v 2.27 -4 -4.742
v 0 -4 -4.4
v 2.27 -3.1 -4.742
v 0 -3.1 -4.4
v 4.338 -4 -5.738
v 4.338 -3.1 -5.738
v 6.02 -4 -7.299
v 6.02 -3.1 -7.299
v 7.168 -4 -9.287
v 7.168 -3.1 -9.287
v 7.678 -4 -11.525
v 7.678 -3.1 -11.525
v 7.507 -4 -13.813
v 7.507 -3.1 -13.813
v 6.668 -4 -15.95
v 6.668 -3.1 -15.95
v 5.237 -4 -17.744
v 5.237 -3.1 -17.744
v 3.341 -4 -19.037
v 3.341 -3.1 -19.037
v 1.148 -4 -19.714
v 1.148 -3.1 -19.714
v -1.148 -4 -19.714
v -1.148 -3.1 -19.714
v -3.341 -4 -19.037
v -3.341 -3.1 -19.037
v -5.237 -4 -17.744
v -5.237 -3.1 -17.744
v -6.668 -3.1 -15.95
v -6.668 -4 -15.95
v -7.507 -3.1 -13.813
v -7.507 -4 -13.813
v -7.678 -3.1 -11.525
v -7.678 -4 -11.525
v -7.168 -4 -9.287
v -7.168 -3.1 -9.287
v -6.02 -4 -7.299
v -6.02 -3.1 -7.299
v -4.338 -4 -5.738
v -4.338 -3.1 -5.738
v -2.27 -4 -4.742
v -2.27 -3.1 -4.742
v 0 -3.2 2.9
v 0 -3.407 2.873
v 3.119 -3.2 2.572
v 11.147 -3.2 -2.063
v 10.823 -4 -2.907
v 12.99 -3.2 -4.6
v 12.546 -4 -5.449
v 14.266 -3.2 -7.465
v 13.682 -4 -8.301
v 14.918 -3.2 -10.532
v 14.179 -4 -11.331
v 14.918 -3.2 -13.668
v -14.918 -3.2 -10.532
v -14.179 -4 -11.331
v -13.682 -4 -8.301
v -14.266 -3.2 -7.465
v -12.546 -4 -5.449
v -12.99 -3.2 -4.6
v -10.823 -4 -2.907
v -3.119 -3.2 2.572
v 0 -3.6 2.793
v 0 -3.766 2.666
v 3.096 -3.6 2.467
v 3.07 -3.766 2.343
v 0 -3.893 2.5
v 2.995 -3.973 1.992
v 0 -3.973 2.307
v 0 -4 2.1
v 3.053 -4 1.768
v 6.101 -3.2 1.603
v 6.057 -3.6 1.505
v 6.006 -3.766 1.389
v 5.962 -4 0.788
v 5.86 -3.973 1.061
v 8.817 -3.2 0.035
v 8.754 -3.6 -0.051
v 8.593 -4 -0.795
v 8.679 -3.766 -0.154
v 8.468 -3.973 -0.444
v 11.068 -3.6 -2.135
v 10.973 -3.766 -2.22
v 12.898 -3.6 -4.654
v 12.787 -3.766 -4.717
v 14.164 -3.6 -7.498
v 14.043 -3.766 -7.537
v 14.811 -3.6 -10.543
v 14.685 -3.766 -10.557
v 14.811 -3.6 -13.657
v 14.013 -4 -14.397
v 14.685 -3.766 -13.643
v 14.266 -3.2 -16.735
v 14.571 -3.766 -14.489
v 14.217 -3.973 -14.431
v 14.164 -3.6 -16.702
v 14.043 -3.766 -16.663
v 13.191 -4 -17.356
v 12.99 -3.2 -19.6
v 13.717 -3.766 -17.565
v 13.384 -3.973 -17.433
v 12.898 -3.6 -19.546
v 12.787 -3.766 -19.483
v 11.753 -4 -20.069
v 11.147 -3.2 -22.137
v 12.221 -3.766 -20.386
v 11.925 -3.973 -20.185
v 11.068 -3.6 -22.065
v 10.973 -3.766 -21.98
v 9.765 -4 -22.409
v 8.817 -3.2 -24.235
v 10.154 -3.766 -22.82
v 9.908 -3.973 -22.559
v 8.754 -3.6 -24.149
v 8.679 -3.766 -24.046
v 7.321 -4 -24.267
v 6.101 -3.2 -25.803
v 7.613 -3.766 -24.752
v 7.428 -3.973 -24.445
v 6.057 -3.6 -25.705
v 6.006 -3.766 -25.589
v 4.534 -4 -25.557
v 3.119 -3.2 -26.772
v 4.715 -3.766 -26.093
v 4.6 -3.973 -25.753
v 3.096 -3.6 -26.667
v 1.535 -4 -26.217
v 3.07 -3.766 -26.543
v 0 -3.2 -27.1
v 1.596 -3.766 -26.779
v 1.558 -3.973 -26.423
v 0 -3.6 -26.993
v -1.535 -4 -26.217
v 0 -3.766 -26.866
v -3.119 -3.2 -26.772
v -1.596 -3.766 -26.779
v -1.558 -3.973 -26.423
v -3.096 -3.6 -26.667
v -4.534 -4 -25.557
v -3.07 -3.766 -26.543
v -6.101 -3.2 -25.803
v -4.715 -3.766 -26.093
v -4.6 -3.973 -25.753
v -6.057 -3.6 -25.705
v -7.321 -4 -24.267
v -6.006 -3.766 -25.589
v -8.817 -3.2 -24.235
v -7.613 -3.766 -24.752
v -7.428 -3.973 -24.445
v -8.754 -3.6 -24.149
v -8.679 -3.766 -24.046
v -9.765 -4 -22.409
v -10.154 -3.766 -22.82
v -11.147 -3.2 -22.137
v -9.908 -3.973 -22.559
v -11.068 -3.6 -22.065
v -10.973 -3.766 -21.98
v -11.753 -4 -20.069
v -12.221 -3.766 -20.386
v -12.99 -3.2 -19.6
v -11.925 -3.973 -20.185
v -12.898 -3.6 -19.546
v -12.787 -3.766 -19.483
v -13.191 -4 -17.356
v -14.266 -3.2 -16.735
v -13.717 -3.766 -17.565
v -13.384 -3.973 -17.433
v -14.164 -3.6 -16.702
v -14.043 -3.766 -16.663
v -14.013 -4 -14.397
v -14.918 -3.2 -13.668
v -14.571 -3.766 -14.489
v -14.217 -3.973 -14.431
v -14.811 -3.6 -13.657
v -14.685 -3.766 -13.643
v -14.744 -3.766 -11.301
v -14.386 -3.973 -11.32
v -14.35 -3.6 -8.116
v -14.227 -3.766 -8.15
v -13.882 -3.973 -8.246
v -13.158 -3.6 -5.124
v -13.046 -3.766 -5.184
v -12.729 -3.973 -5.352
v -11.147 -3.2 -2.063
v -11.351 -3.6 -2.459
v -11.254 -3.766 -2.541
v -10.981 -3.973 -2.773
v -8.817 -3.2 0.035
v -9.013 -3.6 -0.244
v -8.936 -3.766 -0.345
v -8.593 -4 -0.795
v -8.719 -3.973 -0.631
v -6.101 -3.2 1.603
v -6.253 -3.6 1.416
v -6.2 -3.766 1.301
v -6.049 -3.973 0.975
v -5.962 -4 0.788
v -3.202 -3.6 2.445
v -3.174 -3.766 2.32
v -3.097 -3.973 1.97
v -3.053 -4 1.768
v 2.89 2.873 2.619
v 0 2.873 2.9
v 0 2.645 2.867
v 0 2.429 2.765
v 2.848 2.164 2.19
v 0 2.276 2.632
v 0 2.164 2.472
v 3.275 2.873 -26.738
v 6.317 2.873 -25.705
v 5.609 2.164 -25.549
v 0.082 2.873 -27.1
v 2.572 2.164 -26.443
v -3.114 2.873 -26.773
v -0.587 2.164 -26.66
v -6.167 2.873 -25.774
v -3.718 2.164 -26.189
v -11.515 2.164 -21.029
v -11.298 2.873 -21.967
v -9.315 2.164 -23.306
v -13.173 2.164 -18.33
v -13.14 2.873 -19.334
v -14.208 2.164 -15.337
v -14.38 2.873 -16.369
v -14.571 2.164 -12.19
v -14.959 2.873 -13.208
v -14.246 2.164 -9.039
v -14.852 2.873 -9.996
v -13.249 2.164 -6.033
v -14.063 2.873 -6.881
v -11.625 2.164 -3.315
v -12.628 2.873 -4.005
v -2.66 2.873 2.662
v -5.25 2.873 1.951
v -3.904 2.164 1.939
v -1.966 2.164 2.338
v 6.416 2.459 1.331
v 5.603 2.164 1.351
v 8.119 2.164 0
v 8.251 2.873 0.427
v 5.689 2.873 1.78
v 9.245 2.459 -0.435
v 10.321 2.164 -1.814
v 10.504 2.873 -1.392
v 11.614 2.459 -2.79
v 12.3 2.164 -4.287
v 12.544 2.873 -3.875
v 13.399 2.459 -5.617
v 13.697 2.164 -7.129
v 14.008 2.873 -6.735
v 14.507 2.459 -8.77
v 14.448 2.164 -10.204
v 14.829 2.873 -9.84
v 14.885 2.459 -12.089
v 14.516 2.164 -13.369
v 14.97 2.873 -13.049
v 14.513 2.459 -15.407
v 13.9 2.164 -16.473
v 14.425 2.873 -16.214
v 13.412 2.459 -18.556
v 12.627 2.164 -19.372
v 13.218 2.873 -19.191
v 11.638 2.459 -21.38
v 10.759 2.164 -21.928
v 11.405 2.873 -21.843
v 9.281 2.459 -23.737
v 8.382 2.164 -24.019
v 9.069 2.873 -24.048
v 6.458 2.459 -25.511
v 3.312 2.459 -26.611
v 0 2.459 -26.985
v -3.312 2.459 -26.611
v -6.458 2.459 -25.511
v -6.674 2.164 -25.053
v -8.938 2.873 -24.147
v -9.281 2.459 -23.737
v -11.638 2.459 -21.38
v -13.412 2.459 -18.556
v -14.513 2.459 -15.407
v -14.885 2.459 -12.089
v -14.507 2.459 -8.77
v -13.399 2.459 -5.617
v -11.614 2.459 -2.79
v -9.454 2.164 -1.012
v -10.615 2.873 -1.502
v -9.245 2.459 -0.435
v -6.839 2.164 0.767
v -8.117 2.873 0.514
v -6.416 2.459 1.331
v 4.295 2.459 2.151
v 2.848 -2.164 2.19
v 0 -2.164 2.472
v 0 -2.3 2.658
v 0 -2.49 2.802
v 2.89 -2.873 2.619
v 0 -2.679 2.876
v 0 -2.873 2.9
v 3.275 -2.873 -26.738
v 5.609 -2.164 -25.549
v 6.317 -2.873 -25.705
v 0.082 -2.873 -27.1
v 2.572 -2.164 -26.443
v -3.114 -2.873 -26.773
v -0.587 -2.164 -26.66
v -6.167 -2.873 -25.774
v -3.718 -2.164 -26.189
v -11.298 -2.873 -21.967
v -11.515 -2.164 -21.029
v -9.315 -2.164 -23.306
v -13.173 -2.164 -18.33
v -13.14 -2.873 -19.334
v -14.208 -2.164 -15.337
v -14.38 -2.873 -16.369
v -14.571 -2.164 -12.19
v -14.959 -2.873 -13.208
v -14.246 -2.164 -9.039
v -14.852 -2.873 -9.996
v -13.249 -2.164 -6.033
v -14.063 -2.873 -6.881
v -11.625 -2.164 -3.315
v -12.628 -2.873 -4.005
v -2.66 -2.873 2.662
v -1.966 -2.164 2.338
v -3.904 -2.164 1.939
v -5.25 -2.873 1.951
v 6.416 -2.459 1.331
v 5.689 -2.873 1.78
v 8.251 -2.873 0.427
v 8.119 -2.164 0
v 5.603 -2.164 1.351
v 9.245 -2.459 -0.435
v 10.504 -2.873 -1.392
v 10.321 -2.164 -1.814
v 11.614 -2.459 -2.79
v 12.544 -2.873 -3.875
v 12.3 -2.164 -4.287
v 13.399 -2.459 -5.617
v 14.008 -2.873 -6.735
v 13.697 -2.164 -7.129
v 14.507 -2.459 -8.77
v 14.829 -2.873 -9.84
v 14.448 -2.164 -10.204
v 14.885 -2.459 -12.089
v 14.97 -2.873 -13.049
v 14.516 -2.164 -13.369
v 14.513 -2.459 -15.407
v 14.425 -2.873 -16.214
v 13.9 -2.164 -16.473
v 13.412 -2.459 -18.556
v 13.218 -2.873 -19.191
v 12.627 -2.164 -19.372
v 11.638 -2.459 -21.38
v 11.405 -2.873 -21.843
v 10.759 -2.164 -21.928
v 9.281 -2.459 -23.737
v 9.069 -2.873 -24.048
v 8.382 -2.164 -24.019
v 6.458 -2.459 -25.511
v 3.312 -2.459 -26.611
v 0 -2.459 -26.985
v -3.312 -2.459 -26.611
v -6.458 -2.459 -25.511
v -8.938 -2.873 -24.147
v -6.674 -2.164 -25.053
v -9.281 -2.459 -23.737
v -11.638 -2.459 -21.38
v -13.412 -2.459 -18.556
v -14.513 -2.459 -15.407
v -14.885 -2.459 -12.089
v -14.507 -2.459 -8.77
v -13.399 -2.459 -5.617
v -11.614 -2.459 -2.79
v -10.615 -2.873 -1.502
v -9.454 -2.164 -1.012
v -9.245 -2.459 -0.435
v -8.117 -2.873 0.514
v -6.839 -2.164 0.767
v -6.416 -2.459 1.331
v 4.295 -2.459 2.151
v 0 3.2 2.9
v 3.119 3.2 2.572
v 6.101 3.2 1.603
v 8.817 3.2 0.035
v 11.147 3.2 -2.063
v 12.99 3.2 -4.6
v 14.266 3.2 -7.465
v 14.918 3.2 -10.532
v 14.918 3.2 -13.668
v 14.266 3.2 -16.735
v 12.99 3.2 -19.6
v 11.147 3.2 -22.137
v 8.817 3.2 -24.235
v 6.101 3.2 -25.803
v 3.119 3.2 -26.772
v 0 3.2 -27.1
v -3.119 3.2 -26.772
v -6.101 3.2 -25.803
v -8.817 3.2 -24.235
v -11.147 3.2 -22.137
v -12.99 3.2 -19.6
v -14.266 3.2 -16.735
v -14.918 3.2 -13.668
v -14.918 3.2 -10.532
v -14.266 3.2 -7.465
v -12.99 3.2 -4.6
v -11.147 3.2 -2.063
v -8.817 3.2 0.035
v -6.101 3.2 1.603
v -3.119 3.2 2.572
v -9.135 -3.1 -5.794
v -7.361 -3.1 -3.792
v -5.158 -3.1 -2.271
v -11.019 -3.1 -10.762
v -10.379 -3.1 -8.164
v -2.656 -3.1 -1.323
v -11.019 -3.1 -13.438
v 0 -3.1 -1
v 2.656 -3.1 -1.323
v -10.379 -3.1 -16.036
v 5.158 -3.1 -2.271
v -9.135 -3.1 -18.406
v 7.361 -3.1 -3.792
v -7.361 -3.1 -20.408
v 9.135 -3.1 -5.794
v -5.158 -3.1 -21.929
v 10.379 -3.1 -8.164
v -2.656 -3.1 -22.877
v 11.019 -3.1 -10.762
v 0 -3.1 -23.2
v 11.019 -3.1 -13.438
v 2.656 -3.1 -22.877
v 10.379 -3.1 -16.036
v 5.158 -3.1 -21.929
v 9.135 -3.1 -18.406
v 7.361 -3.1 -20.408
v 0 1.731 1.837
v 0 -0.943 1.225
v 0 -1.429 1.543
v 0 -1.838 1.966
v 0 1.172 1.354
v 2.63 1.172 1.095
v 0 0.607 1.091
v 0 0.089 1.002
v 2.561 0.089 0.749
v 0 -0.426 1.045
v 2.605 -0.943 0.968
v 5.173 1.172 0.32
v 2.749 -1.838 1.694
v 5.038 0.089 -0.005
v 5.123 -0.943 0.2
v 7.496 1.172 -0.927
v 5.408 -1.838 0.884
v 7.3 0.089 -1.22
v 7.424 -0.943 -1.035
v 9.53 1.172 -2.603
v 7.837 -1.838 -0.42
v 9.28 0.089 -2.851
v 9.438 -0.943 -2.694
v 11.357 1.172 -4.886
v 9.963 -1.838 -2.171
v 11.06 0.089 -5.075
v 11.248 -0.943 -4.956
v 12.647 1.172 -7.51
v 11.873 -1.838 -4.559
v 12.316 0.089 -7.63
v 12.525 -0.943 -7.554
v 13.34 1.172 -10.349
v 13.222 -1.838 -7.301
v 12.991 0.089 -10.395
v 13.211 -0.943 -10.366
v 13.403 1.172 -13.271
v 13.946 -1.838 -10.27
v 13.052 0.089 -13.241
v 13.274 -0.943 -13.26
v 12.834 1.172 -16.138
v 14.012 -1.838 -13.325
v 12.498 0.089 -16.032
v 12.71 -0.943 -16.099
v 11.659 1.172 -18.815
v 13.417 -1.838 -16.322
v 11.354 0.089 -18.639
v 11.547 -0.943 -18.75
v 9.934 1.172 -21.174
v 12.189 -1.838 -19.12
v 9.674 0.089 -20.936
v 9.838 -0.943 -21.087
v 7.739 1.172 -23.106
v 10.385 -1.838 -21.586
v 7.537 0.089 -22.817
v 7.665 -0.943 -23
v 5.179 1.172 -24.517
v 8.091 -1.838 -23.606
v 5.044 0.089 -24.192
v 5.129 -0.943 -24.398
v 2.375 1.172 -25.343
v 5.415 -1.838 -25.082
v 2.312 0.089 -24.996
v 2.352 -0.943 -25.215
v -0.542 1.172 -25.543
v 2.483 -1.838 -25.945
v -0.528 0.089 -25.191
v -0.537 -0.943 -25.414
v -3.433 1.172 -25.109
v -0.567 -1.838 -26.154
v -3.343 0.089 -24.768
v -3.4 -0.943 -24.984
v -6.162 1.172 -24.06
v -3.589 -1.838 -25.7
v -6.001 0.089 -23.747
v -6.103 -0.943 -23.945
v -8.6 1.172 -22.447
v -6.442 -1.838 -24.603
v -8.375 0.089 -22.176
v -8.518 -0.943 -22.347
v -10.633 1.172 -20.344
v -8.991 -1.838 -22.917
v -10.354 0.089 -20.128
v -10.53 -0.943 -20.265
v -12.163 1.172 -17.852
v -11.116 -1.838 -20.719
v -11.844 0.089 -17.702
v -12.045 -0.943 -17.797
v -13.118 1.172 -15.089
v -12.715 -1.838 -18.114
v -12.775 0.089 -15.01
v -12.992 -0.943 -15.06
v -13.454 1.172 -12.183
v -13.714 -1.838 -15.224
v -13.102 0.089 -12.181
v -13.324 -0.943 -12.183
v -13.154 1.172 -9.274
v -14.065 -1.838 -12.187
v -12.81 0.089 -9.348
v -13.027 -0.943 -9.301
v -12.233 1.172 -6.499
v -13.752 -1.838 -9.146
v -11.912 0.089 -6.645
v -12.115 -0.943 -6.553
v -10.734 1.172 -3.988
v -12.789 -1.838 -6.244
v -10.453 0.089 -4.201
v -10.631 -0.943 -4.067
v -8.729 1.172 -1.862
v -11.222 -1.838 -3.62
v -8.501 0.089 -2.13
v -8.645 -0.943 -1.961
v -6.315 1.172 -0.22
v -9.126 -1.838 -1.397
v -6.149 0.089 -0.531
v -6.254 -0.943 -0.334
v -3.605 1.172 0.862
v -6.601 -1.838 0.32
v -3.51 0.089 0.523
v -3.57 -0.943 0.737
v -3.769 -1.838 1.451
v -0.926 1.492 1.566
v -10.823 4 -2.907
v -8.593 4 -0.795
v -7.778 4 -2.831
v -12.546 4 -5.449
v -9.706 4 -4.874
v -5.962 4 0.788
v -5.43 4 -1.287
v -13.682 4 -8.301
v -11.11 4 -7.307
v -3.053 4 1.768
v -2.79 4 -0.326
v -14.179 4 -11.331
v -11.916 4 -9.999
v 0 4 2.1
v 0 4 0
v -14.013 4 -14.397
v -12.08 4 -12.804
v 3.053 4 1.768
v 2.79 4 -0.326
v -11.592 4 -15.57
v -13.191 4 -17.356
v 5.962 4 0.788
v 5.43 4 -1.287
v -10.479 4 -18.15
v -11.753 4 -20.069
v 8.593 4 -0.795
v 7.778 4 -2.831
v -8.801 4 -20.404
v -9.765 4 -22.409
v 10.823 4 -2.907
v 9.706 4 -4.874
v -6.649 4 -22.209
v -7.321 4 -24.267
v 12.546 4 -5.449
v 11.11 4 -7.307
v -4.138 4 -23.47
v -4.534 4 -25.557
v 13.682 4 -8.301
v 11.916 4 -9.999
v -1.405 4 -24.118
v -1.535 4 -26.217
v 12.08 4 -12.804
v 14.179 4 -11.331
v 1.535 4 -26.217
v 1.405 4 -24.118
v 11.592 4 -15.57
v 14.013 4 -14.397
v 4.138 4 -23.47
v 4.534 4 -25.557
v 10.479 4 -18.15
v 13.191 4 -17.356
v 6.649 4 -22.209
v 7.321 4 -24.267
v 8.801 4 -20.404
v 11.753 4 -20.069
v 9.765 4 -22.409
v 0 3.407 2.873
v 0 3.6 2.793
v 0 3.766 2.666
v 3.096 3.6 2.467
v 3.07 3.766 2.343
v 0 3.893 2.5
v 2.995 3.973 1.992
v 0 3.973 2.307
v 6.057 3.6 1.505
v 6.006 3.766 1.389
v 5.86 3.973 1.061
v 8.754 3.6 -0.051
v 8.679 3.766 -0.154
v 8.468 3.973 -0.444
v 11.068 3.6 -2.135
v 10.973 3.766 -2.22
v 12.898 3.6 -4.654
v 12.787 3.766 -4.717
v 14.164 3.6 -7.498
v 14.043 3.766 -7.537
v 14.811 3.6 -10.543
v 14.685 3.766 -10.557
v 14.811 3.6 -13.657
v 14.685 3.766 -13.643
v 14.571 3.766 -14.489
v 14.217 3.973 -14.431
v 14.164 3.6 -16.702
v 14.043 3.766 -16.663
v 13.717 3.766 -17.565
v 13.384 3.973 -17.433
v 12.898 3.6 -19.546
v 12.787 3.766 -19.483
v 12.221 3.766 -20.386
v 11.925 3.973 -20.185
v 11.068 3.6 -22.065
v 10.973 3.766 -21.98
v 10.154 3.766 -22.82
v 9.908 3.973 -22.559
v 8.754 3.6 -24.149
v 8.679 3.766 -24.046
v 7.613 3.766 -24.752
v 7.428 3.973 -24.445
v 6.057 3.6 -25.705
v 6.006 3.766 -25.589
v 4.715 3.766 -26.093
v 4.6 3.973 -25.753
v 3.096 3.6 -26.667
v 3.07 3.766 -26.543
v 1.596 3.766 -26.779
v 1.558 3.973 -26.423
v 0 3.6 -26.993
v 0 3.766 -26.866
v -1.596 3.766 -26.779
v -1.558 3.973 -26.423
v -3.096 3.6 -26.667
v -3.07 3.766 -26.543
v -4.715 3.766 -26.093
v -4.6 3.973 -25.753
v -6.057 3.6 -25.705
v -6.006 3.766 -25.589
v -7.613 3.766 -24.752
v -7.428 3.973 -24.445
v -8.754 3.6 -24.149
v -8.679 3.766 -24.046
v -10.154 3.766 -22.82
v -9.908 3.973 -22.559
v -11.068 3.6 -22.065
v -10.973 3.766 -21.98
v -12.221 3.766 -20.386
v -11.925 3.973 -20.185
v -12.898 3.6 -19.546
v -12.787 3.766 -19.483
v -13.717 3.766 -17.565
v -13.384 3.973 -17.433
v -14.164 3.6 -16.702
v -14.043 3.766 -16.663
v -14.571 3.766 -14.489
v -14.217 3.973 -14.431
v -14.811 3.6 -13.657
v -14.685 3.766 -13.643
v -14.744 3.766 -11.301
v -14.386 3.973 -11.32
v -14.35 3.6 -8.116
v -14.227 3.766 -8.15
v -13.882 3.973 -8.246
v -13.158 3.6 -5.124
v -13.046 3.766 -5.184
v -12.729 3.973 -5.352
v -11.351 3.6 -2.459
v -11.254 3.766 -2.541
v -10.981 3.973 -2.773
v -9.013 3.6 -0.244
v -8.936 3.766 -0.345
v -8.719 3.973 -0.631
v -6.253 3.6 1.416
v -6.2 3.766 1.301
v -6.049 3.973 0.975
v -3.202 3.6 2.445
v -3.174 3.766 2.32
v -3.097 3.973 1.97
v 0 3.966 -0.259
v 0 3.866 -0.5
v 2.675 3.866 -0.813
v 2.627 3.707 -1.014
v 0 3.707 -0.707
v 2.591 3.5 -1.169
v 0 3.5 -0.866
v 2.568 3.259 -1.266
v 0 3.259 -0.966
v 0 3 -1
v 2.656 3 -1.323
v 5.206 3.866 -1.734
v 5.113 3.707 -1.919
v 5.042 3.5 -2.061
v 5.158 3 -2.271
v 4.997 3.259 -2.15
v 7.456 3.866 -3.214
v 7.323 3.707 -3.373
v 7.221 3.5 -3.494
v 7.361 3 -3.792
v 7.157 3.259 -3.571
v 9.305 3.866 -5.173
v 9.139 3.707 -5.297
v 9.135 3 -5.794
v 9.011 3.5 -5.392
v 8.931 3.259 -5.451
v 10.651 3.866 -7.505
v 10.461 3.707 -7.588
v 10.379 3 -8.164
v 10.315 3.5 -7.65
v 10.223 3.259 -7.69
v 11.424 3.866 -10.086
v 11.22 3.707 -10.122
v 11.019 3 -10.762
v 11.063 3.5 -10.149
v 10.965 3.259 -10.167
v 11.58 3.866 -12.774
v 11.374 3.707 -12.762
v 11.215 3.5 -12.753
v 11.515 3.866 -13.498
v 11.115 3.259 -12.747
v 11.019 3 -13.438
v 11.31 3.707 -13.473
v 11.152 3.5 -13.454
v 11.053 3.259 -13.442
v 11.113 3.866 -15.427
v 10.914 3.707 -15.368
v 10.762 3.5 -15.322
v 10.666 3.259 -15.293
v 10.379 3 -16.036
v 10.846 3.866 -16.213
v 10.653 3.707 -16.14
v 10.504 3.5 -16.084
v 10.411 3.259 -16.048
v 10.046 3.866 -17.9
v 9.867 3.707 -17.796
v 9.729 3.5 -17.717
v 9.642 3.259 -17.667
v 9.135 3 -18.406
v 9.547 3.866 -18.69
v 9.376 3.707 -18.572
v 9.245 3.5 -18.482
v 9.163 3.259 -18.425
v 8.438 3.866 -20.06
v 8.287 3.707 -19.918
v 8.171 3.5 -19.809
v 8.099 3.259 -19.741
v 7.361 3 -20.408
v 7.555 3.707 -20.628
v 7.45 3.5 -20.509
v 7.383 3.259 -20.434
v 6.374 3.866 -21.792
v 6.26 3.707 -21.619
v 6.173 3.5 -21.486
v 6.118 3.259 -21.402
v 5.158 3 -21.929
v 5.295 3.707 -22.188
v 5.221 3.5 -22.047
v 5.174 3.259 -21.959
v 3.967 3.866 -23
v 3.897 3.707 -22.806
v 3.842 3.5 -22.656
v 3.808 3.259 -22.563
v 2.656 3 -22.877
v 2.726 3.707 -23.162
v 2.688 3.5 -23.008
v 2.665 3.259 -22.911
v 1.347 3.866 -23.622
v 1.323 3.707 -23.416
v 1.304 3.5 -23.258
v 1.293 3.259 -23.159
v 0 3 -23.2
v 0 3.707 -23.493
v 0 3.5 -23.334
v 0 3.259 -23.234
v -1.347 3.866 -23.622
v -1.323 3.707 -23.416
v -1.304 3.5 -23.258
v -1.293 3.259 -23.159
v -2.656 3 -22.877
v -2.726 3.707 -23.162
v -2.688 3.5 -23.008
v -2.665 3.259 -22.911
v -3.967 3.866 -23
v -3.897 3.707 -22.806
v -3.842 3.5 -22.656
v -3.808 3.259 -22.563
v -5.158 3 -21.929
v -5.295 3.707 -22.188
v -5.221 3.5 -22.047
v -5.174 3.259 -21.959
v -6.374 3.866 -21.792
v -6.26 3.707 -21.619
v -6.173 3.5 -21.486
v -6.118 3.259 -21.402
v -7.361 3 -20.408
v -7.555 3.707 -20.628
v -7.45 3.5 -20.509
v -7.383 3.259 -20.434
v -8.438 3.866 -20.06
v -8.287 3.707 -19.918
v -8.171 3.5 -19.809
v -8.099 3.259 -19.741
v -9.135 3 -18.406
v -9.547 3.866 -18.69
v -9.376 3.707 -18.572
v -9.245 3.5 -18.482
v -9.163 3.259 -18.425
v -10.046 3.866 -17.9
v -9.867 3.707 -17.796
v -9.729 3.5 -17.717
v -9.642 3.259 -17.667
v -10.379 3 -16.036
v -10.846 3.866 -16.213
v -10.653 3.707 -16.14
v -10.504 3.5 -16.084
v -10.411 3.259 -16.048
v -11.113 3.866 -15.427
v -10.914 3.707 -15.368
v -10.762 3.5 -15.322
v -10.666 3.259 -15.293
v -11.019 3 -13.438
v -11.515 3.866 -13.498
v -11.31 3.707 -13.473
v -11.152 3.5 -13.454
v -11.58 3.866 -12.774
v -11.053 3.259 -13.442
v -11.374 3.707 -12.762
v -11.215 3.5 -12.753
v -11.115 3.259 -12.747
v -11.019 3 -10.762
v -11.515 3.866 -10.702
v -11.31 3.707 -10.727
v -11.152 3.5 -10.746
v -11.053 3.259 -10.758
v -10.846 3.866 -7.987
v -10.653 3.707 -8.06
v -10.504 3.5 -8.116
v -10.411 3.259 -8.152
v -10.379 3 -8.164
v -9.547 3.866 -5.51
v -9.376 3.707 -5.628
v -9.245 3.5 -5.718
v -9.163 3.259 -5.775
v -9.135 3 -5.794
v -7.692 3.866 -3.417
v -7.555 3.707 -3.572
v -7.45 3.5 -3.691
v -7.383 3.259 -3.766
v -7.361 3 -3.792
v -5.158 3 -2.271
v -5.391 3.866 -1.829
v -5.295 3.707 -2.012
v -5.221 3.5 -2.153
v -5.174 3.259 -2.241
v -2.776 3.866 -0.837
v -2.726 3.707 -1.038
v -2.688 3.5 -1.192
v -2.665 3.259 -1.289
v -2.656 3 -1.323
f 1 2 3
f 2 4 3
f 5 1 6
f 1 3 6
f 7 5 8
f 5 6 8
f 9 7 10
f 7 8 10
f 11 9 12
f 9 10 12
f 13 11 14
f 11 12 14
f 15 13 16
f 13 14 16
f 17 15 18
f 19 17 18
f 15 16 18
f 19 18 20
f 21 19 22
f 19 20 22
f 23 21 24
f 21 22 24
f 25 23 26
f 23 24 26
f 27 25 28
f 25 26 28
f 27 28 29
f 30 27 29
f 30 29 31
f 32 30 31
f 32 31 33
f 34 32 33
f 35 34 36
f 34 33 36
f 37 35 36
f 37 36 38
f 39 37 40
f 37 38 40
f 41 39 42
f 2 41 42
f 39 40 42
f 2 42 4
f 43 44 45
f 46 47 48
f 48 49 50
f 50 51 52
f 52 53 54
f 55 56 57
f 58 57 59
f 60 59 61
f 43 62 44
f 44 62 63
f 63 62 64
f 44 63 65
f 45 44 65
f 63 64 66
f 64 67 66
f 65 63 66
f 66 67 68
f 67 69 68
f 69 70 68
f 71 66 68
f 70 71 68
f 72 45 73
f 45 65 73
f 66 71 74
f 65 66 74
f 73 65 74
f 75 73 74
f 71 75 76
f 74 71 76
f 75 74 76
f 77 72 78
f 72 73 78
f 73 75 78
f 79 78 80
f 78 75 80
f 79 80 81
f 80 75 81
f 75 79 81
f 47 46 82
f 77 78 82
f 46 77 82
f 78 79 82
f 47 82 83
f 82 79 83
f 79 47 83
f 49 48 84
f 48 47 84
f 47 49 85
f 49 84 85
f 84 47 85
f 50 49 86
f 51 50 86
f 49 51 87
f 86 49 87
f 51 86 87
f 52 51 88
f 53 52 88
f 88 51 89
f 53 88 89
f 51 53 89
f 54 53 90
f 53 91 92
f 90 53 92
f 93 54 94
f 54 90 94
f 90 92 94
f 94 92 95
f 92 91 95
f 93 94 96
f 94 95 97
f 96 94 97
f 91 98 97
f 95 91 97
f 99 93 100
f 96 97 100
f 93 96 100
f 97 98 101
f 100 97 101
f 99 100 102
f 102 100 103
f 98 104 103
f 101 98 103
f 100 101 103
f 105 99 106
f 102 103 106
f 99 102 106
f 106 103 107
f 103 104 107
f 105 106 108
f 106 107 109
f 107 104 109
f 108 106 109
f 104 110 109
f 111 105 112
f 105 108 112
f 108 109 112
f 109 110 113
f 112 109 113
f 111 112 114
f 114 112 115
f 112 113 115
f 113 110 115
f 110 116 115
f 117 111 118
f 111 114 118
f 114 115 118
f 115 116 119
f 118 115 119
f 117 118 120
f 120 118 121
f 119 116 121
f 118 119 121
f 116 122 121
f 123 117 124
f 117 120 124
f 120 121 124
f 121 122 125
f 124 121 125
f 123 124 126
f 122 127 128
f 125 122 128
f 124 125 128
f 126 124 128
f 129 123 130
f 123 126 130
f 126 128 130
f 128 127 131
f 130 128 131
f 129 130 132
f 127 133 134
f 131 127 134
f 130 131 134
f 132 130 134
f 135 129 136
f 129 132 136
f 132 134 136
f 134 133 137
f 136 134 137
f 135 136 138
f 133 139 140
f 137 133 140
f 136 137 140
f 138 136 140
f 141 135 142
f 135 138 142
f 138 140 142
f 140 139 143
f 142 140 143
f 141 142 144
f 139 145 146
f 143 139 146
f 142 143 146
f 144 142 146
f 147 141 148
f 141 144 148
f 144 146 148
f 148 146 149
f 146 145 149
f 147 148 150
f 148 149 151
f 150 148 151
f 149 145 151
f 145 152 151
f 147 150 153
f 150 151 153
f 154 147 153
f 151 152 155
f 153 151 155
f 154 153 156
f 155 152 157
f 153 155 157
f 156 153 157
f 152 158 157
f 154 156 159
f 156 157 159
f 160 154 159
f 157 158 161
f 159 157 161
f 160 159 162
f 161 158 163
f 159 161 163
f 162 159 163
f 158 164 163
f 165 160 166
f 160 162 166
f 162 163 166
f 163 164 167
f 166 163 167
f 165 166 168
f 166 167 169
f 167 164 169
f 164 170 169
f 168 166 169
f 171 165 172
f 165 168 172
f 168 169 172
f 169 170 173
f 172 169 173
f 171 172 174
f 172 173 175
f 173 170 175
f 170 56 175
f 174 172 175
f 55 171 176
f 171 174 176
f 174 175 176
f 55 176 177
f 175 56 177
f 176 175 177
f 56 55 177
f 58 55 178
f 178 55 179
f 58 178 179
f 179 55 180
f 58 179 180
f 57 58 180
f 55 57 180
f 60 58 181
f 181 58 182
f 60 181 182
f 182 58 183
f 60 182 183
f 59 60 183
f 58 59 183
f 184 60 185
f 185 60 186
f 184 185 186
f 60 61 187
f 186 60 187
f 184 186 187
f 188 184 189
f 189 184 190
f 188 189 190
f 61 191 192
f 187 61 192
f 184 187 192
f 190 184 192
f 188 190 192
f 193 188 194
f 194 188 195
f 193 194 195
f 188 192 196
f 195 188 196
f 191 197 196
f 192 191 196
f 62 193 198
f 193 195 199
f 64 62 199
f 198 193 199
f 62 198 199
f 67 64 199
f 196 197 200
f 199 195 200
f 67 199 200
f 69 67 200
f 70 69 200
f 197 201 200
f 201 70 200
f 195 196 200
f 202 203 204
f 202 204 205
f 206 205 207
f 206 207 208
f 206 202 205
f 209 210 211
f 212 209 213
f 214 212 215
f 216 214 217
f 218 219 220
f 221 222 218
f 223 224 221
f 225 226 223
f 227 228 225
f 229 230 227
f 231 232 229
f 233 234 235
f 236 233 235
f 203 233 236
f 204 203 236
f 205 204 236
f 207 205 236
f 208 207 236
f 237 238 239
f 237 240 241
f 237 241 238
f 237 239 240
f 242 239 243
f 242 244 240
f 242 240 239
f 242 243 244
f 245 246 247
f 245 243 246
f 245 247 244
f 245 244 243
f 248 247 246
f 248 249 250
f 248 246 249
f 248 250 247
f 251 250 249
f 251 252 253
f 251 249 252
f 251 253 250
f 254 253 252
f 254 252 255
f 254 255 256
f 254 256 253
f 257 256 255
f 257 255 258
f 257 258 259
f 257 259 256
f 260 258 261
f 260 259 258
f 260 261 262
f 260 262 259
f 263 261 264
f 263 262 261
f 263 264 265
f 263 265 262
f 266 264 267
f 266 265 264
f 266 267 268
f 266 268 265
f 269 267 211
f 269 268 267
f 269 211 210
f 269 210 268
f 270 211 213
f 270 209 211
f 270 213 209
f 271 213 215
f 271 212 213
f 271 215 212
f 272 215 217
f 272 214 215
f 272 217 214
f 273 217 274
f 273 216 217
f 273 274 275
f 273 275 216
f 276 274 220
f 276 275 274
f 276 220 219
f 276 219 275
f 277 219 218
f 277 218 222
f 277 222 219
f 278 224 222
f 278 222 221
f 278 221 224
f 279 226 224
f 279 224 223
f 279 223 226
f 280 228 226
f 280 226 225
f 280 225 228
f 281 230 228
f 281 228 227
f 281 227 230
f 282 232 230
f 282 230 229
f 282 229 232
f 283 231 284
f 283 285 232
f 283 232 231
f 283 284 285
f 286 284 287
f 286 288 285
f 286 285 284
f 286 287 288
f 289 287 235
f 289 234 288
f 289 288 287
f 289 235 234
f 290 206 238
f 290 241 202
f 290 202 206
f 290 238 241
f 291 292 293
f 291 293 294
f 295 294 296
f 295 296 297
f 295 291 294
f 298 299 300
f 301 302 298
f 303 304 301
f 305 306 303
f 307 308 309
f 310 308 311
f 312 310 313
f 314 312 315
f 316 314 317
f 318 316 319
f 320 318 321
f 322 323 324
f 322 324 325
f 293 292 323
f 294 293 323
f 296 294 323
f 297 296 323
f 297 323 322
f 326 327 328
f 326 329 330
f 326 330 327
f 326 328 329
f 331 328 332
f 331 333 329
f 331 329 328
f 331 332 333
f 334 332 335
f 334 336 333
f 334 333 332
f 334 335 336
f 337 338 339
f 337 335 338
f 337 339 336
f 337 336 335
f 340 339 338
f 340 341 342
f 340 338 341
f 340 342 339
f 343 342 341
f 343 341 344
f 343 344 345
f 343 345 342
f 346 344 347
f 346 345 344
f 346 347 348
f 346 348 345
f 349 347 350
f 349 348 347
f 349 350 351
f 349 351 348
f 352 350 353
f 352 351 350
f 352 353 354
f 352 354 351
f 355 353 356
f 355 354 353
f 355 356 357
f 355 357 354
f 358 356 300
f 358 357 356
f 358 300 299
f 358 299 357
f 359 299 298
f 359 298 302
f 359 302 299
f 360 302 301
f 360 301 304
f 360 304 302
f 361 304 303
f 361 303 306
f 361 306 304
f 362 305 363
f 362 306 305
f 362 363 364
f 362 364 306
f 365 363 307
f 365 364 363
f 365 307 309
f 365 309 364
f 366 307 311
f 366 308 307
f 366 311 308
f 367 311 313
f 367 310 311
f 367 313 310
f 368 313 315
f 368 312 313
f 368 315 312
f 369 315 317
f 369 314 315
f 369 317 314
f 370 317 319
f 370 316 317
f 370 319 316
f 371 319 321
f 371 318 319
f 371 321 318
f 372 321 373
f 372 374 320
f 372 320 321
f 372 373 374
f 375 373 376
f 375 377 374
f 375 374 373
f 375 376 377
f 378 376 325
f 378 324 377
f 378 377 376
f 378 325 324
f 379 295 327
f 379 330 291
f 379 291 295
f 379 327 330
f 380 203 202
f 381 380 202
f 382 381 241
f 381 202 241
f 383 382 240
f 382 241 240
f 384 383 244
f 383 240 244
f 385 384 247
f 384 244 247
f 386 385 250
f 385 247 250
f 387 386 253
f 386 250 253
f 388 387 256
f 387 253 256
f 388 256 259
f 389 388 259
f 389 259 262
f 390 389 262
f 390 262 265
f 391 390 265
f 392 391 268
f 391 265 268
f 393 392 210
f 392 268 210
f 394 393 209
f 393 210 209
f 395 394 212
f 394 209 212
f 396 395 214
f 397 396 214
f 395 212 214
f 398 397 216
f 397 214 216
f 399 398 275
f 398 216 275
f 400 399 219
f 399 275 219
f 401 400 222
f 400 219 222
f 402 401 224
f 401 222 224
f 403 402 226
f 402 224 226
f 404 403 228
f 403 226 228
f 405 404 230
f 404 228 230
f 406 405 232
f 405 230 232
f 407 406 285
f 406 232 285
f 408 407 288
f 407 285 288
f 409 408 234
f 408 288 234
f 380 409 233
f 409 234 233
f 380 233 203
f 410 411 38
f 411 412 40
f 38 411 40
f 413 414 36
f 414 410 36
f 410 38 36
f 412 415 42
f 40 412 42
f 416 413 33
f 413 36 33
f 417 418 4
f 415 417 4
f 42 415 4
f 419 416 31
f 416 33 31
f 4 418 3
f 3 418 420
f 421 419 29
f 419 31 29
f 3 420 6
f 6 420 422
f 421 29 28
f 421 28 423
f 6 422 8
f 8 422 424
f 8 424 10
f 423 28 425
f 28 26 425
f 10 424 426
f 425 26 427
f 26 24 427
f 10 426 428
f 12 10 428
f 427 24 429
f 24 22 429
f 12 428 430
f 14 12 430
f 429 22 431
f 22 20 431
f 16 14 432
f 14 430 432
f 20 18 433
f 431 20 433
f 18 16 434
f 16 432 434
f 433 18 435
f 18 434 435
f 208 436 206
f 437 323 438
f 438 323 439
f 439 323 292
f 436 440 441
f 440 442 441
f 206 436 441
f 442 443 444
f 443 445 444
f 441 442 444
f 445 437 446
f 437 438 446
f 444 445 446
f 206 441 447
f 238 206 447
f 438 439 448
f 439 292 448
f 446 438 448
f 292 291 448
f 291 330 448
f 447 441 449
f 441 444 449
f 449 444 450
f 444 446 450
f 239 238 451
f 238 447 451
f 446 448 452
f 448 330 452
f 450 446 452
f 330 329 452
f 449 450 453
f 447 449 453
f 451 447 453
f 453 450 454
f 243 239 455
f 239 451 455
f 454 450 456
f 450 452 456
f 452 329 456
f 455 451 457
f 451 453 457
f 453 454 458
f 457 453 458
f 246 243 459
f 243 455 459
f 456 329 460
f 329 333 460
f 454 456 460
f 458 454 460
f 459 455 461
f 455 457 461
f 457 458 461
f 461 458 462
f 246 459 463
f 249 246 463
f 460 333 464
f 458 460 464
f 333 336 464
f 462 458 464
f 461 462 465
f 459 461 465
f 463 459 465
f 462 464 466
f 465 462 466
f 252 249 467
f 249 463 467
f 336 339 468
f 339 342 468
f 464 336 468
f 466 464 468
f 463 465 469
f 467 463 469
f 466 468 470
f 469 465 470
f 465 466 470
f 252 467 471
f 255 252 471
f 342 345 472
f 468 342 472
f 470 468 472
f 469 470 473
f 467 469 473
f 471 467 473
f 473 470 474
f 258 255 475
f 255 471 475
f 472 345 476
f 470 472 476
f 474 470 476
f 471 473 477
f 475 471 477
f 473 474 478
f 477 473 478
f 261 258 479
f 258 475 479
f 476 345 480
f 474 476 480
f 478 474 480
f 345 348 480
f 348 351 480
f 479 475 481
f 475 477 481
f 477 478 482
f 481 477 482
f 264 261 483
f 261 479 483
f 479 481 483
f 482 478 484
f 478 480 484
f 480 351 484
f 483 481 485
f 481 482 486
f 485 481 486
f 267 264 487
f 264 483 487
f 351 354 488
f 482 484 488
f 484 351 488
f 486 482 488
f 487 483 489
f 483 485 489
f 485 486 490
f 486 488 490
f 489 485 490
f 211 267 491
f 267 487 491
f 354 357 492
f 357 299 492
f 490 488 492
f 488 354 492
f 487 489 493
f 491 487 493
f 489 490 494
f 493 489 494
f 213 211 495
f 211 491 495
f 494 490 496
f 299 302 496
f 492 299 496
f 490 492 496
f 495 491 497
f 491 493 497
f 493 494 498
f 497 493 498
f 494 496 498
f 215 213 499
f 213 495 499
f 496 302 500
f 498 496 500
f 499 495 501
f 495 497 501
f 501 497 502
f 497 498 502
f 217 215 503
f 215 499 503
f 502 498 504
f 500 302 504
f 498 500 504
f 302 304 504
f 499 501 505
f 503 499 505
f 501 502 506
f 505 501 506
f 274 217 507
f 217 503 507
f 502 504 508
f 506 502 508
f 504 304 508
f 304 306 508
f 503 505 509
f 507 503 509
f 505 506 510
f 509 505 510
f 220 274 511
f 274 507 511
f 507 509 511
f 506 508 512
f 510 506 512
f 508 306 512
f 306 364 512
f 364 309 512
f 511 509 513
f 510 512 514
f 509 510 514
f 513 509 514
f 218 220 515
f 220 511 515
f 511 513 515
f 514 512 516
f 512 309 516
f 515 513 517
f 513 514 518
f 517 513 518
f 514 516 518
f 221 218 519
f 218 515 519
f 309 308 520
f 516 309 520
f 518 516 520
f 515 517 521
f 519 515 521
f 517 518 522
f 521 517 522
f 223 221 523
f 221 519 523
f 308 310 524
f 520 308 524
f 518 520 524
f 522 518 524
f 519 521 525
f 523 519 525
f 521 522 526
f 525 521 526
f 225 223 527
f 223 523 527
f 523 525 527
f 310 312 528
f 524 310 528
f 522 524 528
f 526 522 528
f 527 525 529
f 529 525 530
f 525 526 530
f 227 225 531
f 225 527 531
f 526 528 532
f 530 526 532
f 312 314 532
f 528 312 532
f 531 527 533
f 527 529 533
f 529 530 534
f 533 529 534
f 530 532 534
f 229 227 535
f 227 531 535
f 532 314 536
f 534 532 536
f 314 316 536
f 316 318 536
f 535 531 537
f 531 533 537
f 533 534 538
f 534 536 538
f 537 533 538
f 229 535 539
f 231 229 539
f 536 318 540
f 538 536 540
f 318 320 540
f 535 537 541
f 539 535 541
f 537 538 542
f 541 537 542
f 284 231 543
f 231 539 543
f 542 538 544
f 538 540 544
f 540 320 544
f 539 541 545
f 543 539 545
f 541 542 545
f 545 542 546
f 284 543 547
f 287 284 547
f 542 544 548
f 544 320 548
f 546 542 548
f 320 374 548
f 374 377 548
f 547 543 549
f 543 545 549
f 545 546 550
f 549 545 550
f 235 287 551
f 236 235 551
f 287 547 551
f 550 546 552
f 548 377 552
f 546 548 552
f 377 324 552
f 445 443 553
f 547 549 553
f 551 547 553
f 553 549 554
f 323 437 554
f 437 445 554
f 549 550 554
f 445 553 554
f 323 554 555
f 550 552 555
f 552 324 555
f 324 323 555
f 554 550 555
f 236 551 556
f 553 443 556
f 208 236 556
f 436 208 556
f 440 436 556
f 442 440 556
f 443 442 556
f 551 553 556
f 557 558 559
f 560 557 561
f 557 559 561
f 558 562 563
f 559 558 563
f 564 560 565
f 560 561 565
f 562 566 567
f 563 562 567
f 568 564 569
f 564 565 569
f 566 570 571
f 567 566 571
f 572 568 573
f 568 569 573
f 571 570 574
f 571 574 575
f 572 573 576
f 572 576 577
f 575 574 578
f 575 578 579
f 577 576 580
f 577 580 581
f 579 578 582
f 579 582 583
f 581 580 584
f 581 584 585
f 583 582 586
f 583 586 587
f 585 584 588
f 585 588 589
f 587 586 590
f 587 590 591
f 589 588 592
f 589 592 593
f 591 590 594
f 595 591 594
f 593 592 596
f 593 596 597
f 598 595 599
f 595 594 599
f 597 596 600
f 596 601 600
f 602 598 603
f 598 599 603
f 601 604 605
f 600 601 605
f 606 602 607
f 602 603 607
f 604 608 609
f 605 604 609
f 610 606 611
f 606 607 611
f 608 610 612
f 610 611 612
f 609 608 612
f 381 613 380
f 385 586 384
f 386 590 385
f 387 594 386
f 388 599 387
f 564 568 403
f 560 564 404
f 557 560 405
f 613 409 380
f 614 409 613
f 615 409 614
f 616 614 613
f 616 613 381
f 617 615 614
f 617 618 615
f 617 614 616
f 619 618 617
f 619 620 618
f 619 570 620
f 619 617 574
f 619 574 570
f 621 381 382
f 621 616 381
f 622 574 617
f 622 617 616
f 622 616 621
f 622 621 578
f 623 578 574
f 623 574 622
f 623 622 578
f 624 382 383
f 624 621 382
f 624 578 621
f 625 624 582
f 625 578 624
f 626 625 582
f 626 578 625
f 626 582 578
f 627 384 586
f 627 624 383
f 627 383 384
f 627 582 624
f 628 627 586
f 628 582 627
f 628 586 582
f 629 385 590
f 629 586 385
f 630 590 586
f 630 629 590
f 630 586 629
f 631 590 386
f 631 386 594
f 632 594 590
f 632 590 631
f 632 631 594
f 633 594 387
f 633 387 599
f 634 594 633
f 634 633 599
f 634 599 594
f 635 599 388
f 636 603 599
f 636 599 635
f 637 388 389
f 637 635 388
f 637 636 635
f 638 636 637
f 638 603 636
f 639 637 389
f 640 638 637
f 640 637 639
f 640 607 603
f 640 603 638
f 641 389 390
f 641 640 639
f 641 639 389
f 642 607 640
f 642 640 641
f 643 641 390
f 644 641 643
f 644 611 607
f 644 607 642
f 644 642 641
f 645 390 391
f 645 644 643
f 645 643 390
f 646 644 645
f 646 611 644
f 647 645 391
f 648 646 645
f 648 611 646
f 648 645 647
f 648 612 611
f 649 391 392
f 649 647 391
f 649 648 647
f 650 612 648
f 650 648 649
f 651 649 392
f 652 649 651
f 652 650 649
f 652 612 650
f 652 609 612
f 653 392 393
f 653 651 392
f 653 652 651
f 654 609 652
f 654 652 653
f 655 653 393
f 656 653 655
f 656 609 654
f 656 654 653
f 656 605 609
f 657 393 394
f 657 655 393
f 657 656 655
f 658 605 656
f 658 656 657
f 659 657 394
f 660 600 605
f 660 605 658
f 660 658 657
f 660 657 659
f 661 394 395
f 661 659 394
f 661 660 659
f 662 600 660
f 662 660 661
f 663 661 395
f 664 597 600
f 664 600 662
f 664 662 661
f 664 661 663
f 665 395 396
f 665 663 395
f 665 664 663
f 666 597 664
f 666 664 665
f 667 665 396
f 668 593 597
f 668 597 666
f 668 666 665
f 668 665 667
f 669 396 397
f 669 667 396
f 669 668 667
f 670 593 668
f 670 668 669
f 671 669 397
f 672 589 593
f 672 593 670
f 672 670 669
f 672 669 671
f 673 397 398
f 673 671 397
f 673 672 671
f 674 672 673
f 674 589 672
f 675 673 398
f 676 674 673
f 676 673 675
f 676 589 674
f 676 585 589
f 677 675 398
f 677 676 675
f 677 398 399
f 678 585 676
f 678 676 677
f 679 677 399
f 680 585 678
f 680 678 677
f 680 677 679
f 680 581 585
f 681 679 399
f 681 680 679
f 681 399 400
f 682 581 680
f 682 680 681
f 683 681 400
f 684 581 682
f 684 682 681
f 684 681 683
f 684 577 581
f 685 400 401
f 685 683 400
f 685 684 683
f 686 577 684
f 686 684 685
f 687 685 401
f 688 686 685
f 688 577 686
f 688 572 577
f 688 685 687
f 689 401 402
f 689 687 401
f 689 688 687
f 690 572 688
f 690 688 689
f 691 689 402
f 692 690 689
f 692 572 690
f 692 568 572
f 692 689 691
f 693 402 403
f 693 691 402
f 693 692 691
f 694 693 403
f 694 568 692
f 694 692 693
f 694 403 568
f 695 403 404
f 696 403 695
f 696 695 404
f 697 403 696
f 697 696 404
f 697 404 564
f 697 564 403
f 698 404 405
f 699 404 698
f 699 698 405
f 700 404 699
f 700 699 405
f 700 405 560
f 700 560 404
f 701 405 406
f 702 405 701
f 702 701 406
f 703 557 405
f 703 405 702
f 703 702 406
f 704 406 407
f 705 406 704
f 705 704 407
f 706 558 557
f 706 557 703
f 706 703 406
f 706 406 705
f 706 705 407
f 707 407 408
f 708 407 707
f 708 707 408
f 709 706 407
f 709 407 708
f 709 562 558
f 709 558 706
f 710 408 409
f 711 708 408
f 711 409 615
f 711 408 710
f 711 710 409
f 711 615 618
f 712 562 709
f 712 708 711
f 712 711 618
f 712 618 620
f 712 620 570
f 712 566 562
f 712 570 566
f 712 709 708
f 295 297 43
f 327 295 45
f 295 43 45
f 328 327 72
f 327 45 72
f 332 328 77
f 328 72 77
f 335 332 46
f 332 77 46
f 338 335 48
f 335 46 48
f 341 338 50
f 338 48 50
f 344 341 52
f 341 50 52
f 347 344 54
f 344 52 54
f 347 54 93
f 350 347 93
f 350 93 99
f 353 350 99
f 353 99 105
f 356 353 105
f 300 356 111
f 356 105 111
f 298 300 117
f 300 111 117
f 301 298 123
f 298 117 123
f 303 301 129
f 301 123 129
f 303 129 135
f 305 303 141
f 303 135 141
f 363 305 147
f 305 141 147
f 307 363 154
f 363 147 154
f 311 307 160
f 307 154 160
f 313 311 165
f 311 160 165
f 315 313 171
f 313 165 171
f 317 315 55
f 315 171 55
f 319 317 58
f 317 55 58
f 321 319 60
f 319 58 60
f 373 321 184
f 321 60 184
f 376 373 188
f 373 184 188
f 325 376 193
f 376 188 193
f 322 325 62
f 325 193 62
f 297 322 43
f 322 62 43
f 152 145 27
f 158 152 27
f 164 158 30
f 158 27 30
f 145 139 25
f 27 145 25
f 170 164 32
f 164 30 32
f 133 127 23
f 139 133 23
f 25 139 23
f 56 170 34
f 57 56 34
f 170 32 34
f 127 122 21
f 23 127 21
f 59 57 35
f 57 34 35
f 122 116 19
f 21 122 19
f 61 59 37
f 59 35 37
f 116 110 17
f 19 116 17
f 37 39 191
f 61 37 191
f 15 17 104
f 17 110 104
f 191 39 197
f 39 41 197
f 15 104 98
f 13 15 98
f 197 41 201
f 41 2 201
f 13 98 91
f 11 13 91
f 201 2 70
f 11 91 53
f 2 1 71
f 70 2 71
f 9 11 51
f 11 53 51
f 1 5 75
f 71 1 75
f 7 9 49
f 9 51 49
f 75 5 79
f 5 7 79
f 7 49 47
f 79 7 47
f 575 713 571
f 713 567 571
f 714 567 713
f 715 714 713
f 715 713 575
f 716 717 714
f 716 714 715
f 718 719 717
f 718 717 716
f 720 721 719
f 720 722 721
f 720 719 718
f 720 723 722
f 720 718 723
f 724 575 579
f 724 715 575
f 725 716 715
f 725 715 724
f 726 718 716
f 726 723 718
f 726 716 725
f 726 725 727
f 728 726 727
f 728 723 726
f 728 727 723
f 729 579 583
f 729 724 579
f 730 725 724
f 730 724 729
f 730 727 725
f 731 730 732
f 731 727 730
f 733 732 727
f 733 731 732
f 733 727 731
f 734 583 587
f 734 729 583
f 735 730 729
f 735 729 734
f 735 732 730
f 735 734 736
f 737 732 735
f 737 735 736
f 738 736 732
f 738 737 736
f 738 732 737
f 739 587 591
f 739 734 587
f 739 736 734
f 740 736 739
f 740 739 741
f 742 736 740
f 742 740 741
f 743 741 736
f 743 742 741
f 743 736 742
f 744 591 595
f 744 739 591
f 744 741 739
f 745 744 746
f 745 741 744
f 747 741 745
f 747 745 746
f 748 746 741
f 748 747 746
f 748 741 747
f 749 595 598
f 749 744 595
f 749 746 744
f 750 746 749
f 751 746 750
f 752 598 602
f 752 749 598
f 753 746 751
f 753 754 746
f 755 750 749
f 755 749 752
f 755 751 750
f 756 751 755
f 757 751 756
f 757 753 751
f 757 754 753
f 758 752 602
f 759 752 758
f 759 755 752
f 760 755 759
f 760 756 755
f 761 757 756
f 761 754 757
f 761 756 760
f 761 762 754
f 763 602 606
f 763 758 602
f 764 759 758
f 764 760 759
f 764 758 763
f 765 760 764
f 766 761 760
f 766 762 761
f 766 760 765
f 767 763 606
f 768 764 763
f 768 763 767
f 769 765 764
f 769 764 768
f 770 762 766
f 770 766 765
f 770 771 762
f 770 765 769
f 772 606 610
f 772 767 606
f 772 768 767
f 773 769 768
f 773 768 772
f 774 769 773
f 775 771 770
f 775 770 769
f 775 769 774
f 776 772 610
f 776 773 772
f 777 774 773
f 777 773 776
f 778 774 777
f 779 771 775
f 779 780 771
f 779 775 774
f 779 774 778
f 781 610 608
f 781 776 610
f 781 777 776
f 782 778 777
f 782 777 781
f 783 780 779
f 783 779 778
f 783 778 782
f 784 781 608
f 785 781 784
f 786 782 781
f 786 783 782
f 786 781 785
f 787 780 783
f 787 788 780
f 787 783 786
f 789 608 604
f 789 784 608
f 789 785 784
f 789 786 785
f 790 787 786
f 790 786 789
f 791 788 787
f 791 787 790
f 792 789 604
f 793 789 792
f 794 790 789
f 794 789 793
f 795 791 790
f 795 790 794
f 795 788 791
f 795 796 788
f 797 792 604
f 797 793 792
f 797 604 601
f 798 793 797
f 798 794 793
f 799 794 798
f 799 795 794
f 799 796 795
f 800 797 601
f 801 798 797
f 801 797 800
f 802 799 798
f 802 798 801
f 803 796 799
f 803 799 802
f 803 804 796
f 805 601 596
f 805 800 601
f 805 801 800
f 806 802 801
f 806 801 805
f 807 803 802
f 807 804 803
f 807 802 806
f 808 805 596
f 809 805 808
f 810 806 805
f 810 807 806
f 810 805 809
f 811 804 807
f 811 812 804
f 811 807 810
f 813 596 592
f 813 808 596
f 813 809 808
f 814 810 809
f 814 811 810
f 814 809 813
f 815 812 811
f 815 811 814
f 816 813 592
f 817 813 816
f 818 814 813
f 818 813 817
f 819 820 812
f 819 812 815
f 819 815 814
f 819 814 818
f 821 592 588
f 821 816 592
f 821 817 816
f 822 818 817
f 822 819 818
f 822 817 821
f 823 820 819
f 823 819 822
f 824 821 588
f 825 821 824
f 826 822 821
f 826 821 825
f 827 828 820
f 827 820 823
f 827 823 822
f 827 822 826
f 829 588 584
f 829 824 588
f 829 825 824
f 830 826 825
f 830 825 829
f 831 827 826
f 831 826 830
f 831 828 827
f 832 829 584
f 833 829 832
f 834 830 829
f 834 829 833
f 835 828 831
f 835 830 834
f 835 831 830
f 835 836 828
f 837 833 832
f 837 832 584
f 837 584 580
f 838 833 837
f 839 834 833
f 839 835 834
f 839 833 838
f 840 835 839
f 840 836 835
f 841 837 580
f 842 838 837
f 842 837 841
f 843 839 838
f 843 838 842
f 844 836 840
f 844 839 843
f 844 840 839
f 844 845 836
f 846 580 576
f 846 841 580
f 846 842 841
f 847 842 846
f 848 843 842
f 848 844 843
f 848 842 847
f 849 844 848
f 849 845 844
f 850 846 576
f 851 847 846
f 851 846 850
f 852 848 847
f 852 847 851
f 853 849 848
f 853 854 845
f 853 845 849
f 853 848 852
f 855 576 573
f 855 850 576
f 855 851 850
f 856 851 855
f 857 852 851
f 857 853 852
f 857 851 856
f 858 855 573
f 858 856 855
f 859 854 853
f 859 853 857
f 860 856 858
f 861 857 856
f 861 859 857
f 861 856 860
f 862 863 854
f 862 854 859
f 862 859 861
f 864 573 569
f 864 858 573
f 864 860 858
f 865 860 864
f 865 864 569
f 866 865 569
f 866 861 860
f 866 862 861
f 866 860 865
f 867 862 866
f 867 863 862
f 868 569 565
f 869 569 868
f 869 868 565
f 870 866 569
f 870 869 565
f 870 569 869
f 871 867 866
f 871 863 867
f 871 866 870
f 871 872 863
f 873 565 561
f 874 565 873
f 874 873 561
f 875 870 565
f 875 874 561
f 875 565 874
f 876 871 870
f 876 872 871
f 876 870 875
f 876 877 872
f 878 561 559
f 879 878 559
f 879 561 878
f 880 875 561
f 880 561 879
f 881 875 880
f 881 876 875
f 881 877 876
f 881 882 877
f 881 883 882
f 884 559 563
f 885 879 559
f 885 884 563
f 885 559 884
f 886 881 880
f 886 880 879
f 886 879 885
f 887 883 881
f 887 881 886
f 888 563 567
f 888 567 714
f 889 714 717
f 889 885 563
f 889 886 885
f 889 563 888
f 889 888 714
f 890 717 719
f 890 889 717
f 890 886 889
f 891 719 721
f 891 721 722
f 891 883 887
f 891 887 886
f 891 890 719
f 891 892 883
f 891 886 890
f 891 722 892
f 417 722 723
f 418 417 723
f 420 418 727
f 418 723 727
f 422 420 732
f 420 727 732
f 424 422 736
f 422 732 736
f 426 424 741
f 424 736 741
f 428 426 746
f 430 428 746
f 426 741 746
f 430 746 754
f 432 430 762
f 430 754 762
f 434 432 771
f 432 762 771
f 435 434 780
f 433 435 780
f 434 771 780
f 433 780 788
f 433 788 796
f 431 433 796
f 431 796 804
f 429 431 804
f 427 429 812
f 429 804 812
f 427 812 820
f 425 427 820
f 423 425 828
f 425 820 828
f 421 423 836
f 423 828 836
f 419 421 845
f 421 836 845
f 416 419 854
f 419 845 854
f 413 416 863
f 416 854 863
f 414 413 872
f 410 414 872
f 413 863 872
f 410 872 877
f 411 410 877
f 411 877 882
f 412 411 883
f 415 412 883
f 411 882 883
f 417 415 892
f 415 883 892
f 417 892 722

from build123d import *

# Parameters (mm, degrees)
F0_W = 0.9
F0_H = 3.4
F2_R = 0.8
F3_R = 1


with BuildPart() as f1:
    # F0 (on Right) → F1 (revolve)
    with BuildSketch(Plane.YZ):
        with BuildLine():
            Line((0, 1), (4, 1))
            Line((4, 1), (4, 2.9))
            Line((4, 2.9), (2.3544265014, 2.9))
            add(Edge.make_bspline(
                [(0, 1), (1.6531079691, 1), (2.3544265014, 2.9)],
                knots=[0, 0, 0, 1.1326711984, 1.1326711984, 1.1326711984], degree=2, weights=[1, 0.8438727464, 1]))
        make_face()
        Polygon((-3.1, -1), (4, -1), (4, 1), (0, 1), (-4, 1), (-4, -1), align=None)
        with BuildLine():
            Line((-4, 1), (0, 1))
            add(Edge.make_bspline(
                [(-2.3544265014, 2.9), (-1.6531079691, 1), (0, 1)],
                knots=[5.1505141088, 5.1505141088, 5.1505141088, 6.2831853072, 6.2831853072, 6.2831853072], degree=2, weights=[1, 0.8438727464, 1]))
            Line((-2.3544265014, 2.9), (-4, 2.9))
            Line((-4, 2.9), (-4, 1))
        make_face()
        with Locations((-3.55, -2.7)):
            Rectangle(F0_W, F0_H)
    revolve(axis=Axis((0, 0, -12.1), (0, 1, 0)))

    # F2
    f2_edges = [f1.edges().sort_by_distance(p)[0] for p in [
        (0, 4, -27.1),
        (0, -4, -27.1),
        (0, 2.354427, -27.1),
        (0, 0, 1),
        (0, -2.354427, -27.1),
    ]]
    fillet(f2_edges, radius=F2_R)

    # F3
    f3_edges = [f1.edges().sort_by_distance(p)[0] for p in [
        (0, 4, -23.2),
    ]]
    fillet(f3_edges, radius=F3_R)


solid = f1.part
